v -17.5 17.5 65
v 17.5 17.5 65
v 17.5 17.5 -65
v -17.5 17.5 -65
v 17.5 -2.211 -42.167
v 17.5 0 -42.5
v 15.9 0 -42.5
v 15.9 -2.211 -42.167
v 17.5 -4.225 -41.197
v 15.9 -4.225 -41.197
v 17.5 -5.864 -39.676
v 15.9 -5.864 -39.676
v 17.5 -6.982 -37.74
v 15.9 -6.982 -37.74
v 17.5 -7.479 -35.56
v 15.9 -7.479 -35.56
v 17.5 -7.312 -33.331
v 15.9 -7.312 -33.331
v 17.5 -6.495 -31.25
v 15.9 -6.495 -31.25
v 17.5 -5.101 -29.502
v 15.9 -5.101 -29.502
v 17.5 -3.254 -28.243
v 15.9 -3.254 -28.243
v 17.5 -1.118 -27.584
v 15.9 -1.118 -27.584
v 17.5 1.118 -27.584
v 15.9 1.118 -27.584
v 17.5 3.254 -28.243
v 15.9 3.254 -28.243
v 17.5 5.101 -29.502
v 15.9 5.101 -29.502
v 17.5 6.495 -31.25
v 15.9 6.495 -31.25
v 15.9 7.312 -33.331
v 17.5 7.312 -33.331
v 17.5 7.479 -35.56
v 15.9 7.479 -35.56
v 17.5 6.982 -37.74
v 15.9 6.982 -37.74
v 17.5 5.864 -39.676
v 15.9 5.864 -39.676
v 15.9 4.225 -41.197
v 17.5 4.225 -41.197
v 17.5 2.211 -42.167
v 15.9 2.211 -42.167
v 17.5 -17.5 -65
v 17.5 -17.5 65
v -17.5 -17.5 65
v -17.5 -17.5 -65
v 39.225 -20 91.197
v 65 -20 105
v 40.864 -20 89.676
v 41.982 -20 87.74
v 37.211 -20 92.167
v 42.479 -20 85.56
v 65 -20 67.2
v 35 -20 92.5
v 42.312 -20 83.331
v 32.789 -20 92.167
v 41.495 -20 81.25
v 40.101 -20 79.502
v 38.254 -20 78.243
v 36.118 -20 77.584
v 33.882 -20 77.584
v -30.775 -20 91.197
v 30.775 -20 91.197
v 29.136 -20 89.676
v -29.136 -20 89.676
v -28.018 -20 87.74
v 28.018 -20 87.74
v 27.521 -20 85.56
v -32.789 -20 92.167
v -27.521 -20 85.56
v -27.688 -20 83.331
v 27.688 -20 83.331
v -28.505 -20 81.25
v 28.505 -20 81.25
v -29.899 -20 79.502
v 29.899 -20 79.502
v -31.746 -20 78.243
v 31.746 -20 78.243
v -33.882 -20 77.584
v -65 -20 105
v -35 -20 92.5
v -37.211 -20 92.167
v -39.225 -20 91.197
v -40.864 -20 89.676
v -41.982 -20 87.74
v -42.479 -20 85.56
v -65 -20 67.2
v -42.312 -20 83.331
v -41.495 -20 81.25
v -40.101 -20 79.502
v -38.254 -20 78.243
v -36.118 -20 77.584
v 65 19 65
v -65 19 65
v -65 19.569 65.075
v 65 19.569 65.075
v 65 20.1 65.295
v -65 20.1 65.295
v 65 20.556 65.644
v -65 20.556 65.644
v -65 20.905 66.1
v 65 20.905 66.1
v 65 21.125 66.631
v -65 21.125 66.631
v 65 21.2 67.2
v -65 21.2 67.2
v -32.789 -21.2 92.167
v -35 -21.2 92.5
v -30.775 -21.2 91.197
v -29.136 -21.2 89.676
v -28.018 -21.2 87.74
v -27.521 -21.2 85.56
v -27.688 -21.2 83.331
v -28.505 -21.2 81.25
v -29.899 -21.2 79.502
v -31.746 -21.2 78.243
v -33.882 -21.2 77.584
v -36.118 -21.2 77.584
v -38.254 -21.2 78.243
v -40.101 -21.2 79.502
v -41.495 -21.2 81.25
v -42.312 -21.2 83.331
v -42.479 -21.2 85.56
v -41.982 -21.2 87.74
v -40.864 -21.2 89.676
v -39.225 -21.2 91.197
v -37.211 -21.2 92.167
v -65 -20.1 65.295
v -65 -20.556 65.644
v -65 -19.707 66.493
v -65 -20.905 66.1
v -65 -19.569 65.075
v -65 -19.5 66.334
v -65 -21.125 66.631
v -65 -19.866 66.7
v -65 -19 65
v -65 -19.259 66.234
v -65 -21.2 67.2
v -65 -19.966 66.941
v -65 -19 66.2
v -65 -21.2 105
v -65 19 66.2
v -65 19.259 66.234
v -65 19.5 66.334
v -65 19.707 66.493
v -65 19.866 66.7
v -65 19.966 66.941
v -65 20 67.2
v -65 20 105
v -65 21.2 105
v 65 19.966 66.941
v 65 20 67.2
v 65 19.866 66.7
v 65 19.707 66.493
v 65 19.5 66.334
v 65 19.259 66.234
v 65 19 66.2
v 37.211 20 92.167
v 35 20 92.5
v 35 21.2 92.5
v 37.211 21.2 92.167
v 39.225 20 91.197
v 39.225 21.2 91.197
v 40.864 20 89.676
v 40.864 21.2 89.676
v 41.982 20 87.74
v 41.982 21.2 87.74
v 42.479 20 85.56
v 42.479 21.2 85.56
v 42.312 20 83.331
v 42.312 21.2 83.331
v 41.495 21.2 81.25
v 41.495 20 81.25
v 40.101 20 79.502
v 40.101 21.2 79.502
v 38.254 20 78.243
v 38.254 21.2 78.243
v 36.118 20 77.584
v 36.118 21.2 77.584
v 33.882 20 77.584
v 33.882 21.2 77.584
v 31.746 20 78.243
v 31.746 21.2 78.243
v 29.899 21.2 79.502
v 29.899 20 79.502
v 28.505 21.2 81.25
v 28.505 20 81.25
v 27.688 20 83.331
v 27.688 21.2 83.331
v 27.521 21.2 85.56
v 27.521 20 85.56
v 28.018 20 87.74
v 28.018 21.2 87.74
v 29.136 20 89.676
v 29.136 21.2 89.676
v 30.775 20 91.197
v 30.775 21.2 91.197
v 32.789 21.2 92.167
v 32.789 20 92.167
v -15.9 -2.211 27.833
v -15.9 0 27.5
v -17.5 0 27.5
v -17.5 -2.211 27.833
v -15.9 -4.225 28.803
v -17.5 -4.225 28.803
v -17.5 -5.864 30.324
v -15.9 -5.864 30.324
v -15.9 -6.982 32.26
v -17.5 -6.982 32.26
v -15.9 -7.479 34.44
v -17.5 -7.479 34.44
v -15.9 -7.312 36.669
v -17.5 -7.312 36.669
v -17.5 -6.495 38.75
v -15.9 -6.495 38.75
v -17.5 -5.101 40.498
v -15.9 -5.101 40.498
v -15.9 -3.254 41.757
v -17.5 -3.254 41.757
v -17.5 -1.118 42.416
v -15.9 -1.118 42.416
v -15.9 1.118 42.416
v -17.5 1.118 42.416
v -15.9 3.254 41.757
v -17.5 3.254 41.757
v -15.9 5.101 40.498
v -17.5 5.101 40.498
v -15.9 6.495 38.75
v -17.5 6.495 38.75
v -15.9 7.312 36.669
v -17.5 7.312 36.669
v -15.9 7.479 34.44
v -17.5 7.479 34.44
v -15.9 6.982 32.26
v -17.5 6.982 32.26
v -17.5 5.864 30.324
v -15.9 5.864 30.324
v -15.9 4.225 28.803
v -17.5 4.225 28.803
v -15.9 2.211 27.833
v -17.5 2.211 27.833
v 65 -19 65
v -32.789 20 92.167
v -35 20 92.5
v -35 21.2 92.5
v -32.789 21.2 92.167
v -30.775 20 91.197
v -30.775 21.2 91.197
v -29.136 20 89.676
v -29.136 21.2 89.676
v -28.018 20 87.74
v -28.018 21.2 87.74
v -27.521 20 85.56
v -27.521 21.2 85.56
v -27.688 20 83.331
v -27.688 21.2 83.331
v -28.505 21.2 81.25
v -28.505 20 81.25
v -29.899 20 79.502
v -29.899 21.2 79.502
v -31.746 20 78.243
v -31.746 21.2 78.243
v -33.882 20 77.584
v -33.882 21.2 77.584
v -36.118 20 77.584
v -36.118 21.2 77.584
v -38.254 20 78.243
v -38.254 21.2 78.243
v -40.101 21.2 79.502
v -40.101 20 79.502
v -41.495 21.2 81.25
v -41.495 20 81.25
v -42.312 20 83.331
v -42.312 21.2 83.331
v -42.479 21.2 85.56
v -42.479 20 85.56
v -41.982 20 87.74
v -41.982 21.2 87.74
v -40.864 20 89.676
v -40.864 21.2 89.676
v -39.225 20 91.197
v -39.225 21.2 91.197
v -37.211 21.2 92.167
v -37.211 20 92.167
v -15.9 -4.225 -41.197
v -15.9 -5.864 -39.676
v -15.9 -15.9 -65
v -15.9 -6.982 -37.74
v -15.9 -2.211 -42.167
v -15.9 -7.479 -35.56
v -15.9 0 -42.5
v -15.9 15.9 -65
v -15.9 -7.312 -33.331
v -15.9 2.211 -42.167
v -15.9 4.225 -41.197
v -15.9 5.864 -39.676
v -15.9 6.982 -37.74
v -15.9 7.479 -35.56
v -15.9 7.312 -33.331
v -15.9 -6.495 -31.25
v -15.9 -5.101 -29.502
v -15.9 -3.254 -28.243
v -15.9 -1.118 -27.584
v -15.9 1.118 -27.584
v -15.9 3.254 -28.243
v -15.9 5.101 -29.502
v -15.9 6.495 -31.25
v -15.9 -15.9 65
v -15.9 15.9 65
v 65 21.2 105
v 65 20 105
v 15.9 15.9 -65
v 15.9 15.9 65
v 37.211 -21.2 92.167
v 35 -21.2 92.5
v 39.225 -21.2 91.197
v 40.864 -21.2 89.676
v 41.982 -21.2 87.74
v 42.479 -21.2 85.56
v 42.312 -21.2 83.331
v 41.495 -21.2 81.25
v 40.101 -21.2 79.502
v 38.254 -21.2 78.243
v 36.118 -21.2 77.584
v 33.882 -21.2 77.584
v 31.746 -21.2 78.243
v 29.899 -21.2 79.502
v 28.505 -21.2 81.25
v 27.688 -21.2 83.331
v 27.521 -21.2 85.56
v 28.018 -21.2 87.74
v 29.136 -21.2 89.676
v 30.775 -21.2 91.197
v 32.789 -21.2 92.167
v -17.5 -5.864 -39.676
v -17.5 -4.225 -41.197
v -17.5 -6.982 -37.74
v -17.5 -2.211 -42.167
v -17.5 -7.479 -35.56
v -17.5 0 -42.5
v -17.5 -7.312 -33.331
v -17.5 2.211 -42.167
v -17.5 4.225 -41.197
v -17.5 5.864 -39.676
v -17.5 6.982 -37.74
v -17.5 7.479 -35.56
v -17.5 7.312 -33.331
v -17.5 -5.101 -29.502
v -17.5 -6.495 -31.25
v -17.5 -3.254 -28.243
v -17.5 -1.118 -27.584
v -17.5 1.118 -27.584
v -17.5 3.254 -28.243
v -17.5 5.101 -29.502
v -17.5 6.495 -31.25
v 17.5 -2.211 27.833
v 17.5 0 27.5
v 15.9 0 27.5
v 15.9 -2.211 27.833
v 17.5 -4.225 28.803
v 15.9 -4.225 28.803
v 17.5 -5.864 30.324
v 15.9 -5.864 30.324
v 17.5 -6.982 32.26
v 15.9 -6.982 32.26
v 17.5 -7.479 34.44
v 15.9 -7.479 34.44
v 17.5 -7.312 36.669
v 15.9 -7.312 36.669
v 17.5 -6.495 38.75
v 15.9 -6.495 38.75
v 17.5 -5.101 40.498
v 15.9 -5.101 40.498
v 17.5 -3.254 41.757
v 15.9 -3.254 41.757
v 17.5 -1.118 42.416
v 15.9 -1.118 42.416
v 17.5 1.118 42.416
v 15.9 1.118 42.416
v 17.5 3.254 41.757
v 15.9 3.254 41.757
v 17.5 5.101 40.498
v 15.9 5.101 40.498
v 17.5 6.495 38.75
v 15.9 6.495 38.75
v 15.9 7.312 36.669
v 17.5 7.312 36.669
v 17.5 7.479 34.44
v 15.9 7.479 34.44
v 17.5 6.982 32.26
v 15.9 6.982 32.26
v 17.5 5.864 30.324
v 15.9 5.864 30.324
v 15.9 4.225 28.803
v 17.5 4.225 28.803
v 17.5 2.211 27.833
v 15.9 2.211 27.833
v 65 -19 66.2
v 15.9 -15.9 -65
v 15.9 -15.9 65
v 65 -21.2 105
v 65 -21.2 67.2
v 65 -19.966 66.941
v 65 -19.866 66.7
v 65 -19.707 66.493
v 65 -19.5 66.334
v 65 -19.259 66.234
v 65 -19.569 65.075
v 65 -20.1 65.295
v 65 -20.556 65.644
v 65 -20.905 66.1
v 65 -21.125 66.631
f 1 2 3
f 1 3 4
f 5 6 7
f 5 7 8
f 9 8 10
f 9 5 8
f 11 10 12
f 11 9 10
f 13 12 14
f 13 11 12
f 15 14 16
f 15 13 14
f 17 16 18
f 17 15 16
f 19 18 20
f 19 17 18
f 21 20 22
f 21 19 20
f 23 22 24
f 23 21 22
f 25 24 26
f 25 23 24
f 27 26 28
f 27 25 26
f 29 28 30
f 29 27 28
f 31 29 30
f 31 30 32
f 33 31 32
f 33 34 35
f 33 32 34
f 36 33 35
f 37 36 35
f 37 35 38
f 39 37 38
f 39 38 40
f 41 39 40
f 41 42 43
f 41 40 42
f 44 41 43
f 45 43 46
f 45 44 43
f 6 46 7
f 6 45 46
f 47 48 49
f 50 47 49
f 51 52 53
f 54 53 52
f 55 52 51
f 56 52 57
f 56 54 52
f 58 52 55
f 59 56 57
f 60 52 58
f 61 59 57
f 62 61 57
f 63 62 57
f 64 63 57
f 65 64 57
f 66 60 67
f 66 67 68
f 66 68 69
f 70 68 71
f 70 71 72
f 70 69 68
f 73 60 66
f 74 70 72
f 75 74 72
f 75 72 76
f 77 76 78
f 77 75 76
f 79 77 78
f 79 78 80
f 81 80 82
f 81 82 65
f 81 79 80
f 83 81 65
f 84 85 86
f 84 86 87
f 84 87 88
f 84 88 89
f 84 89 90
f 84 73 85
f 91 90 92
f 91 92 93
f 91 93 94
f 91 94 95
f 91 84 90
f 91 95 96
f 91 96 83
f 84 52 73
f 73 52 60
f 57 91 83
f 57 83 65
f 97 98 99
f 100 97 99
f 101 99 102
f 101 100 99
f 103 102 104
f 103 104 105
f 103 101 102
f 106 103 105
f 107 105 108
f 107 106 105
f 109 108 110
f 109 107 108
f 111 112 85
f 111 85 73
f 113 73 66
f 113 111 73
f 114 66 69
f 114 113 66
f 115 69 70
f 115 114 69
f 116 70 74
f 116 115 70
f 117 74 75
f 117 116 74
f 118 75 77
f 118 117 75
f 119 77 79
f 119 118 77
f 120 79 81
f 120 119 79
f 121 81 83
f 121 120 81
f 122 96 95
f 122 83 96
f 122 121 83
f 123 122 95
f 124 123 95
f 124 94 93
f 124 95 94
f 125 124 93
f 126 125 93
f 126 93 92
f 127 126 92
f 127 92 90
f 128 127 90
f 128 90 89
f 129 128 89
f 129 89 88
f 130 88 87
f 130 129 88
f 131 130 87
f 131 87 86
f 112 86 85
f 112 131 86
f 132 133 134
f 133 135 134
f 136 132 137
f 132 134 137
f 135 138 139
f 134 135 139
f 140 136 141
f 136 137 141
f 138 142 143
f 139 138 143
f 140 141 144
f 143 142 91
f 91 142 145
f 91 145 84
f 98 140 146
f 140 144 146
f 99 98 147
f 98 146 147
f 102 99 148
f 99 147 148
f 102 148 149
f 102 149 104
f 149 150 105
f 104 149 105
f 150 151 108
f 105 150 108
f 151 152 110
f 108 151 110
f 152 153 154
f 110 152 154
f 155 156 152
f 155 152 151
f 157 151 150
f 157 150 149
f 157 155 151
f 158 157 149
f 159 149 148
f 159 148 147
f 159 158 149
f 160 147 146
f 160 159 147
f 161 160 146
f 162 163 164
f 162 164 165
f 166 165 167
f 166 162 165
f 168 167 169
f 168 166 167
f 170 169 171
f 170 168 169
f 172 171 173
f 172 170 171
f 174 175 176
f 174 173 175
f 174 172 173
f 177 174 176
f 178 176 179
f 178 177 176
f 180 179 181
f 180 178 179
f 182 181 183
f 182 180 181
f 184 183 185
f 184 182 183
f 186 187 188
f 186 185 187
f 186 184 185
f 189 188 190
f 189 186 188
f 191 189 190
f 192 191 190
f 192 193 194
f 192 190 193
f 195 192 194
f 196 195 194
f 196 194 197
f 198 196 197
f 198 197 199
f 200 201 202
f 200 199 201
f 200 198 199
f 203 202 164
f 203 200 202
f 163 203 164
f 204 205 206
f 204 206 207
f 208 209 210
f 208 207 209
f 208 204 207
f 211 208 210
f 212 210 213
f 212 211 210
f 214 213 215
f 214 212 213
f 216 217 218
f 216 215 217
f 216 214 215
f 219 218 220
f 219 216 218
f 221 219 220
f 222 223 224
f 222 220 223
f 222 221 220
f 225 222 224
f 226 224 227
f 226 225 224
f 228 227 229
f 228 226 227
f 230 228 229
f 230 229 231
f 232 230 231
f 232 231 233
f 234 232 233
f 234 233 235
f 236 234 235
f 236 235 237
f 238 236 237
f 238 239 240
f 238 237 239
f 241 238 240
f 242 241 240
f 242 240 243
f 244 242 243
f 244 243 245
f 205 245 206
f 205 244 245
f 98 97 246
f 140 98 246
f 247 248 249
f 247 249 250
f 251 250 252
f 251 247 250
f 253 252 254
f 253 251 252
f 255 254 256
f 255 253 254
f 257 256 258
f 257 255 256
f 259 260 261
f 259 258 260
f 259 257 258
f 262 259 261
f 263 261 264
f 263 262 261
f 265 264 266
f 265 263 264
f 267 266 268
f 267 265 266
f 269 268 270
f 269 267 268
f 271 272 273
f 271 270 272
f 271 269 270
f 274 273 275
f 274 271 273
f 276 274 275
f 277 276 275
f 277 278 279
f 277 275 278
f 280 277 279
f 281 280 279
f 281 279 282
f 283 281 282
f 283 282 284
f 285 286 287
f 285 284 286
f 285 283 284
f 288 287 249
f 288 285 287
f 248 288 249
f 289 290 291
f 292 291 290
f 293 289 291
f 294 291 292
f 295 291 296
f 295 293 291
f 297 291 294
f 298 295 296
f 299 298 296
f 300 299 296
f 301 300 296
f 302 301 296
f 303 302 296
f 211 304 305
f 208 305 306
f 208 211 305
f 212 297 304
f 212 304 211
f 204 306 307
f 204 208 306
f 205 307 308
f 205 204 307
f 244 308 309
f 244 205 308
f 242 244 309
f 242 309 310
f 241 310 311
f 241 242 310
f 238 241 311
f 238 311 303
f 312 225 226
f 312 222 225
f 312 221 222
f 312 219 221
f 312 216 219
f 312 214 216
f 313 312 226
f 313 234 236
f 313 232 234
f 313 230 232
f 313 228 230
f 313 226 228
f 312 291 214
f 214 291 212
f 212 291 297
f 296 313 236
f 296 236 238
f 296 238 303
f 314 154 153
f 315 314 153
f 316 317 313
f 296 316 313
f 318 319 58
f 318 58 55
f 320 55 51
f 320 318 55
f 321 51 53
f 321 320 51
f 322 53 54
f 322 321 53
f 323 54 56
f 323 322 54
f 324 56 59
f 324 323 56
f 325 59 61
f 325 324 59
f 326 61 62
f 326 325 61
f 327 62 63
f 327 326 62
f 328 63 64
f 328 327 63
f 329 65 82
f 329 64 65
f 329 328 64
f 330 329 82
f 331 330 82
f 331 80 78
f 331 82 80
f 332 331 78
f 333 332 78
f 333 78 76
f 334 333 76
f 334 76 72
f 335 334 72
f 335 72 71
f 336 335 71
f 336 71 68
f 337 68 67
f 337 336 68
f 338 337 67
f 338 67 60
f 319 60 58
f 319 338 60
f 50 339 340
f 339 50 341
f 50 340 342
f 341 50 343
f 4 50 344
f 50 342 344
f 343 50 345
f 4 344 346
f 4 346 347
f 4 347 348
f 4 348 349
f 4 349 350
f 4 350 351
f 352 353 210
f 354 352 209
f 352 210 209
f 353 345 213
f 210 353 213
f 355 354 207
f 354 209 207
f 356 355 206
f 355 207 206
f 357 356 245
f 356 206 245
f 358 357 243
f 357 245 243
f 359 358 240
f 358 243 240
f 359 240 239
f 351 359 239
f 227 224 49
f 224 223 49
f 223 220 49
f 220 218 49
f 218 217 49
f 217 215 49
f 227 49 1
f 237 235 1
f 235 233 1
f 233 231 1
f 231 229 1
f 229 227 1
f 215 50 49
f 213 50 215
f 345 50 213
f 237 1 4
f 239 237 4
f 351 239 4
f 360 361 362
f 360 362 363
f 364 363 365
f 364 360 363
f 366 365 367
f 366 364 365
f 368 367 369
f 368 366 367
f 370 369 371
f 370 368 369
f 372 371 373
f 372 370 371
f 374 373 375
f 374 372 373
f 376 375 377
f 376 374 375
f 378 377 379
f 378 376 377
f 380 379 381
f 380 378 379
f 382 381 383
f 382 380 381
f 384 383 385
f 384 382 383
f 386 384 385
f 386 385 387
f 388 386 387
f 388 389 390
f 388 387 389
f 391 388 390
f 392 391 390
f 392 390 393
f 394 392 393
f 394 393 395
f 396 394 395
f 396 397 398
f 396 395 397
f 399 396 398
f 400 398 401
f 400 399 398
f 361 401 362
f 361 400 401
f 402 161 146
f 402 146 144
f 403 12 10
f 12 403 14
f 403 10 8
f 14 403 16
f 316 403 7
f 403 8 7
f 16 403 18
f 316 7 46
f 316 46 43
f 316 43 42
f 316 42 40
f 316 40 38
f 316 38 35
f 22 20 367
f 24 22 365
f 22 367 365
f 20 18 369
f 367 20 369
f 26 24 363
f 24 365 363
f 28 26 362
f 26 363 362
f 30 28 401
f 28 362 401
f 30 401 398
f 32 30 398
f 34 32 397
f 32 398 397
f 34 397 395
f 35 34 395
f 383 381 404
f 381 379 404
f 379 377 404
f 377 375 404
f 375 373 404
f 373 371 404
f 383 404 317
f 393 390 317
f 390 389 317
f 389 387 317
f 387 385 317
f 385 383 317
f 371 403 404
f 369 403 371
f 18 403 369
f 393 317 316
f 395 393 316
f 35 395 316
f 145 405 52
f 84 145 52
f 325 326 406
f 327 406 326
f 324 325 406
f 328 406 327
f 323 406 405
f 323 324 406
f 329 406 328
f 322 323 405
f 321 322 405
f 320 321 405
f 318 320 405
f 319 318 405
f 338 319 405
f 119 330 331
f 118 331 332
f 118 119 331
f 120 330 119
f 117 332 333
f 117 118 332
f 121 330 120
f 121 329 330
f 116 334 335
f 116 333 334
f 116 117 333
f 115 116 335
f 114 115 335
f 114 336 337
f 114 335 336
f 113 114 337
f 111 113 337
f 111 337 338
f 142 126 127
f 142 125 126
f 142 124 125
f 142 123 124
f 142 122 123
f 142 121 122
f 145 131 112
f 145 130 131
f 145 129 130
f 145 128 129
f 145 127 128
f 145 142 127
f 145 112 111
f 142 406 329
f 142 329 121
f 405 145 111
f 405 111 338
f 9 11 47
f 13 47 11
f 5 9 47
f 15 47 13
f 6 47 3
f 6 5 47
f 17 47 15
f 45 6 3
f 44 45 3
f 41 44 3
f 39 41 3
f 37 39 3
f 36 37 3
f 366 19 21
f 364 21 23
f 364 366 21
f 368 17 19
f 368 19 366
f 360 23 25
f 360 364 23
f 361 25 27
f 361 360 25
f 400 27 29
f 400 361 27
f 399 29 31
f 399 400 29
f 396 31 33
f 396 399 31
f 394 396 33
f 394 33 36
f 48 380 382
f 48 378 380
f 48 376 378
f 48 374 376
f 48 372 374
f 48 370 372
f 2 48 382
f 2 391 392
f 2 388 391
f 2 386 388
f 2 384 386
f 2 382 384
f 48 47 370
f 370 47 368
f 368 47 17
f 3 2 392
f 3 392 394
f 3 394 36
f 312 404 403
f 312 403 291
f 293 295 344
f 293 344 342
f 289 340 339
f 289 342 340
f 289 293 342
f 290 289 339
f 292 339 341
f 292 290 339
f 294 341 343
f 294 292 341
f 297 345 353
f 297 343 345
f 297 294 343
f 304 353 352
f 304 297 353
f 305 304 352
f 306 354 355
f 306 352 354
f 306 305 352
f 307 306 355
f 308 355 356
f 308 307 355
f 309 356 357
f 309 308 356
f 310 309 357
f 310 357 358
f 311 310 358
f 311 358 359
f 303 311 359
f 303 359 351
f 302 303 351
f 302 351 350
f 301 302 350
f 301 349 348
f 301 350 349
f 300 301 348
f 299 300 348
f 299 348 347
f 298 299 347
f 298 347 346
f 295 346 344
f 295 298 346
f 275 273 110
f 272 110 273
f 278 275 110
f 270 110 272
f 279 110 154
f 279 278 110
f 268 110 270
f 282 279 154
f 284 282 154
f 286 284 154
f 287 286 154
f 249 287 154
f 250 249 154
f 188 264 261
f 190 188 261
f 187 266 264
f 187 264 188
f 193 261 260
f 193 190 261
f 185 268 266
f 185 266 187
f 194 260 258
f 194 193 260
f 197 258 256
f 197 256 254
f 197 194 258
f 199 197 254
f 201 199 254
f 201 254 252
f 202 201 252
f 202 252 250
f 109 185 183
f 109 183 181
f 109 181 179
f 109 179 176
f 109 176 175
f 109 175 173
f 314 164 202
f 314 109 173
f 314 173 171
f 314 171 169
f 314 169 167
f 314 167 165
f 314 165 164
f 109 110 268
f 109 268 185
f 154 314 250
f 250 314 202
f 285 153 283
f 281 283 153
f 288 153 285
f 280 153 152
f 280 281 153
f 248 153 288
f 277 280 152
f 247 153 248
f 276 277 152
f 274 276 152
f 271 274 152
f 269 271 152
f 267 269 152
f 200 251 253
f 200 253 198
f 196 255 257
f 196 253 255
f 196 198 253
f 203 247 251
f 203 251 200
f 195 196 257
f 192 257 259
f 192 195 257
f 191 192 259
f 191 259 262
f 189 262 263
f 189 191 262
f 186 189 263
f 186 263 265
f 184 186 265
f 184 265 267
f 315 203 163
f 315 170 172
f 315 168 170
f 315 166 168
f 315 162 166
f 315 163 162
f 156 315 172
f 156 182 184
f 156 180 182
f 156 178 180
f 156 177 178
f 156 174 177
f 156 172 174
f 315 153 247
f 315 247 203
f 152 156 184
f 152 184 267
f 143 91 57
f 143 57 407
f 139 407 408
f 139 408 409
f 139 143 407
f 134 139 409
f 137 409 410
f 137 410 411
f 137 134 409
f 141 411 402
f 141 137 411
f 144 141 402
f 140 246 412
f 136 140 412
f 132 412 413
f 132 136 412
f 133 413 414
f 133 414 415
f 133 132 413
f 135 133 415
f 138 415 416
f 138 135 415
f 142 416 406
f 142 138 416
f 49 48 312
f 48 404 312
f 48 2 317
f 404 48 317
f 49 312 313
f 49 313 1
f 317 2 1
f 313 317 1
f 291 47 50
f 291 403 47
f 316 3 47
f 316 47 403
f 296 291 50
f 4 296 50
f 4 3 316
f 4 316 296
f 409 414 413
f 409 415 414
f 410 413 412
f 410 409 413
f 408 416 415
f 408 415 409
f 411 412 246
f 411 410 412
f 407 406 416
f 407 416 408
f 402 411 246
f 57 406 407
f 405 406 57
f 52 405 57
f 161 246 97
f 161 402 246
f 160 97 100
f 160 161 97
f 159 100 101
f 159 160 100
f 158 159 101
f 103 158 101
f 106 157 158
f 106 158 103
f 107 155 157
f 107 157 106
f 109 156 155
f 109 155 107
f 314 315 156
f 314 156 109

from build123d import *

# Parameters (mm, degrees)
CROQUIS11_W                        = 35
CROQUIS11_H                        = 35
CROQUIS11_W_2                      = 31.8
CROQUIS11_H_2                      = 31.8
CUADRADO_35X35X1_6_1_DEPTH         = 130
CORTAR_EXTRUIR1_DEPTH              = 76.869954527
CORTAR_EXTRUIR1_DEPTH_BACK         = 76.869954527
CROQUIS12_R                        = 7.5
CROQUIS14_W                        = 40
CROQUIS14_H                        = 130
BRIDA_BASE1_DEPTH                  = 1.2
BRIDA_DE_ARISTA1_STRIP_W           = 6.8
BRIDA_DE_ARISTA1_STRIP_H           = 1.2
BRIDA_DE_ARISTA1_STRIP_CUT_DEPTH   = 130
BRIDA_DE_ARISTA1_STRIP_2_W         = 6.8
BRIDA_DE_ARISTA1_STRIP_2_H         = 1.2
BRIDA_DE_ARISTA1_STRIP_CUT_2_DEPTH = 130
BRIDA_DE_ARISTA1_DEPTH             = 130
BRIDA_DE_ARISTA1_BEND_DEPTH        = 130
CORTAR_EXTRUIR2_DEPTH              = 131.567070887
CORTAR_EXTRUIR2_DEPTH_BACK         = 131.567070887
CROQUIS26_R                        = 7.5
S_LIDO_MOVER_COPIAR1_ANGLE         = 90


# Sheet-metal steps are written as plain solids
with BuildPart() as part:
    # Croquis11 → Cuadrado 35X35X1.6(1) (new body)
    with BuildSketch(Plane(origin=(0, 0, 65), x_dir=(-1, 0, 0), z_dir=(0, 0, -1))):
        Rectangle(CROQUIS11_W, CROQUIS11_H)
        Rectangle(CROQUIS11_W_2, CROQUIS11_H_2, mode=Mode.SUBTRACT)
    extrude(amount=CUADRADO_35X35X1_6_1_DEPTH)

    # Croquis12 → Cortar-Extruir1 (cut, two sides: drawn at the far end of the back side and taken through both)
    with BuildSketch(Plane.ZY.offset(17.5).offset(-CORTAR_EXTRUIR1_DEPTH_BACK)):
        with Locations(Location((35, 0, 0), (0, 0, 180))):
            Circle(CROQUIS12_R)
        with Locations(Location((-35, 0, 0), (0, 0, 180))):
            Circle(CROQUIS12_R)
    extrude(amount=CORTAR_EXTRUIR1_DEPTH + CORTAR_EXTRUIR1_DEPTH_BACK, mode=Mode.SUBTRACT)


with BuildPart() as body_2:
    # Croquis14 → Brida base1 (new body)
    with BuildSketch(Plane.XY.offset(65)):
        Rectangle(CROQUIS14_W, CROQUIS14_H)
    extrude(amount=BRIDA_BASE1_DEPTH)

    # Brida de arista1 strip (across the edge) → Brida de arista1 strip cut (cut)
    with BuildSketch(Plane(origin=(20, -65, 66.2), x_dir=(-1, 0, 0), z_dir=(0, 1, 0))):
        with Locations((-2.4, -0.6)):
            Rectangle(BRIDA_DE_ARISTA1_STRIP_W, BRIDA_DE_ARISTA1_STRIP_H)
    extrude(amount=BRIDA_DE_ARISTA1_STRIP_CUT_DEPTH, mode=Mode.SUBTRACT)

    # Brida de arista1 strip 2 (across the edge) → Brida de arista1 strip cut 2 (cut)
    with BuildSketch(Plane(origin=(-20, 65, 66.2), x_dir=(1, 0, 0), z_dir=(0, -1, 0))):
        with Locations((-2.4, -0.6)):
            Rectangle(BRIDA_DE_ARISTA1_STRIP_2_W, BRIDA_DE_ARISTA1_STRIP_2_H)
    extrude(amount=BRIDA_DE_ARISTA1_STRIP_CUT_2_DEPTH, mode=Mode.SUBTRACT)

    # Brida de arista1 section (across the edge) → Brida de arista1 (add)
    with BuildSketch(Plane(origin=(20, -65, 66.2), x_dir=(-1, 0, 0), z_dir=(0, 1, 0))):
        with BuildLine():
            Line((-1.2, 1), (-1.2, 38.8))
            Line((-1.2, 38.8), (0, 38.8))
            Line((0, 38.8), (0, 1))
            ThreePointArc((0, 1), (0.292893219, 0.292893219), (1, 0))
            Line((1, 0), (1, -1.2))
            ThreePointArc((1, -1.2), (-0.555634919, -0.555634919), (-1.2, 1))
        make_face()
    extrude(amount=BRIDA_DE_ARISTA1_DEPTH)

    # Brida de arista1 section 2 (across the edge) → Brida de arista1 bend (add)
    with BuildSketch(Plane(origin=(-20, 65, 66.2), x_dir=(1, 0, 0), z_dir=(0, -1, 0))):
        with BuildLine():
            Line((-1.2, 1), (-1.2, 38.8))
            Line((-1.2, 38.8), (0, 38.8))
            Line((0, 38.8), (0, 1))
            ThreePointArc((0, 1), (0.292893219, 0.292893219), (1, 0))
            Line((1, 0), (1, -1.2))
            ThreePointArc((1, -1.2), (-0.555634919, -0.555634919), (-1.2, 1))
        make_face()
    extrude(amount=BRIDA_DE_ARISTA1_BEND_DEPTH)

    # Croquis26 → Cortar-Extruir2 (cut, two sides: drawn at the far end of the back side and taken through both)
    with BuildSketch(Plane.ZY.offset(21.2).offset(-CORTAR_EXTRUIR2_DEPTH_BACK)):
        with Locations((85, 35)):
            Circle(CROQUIS26_R)
        with Locations((85, -35)):
            Circle(CROQUIS26_R)
    extrude(amount=CORTAR_EXTRUIR2_DEPTH + CORTAR_EXTRUIR2_DEPTH_BACK, mode=Mode.SUBTRACT)


with BuildPart() as body_2_1:
    # Sólido-Mover/Copiar1: moved
    add(body_2.part.rotate(Axis((0, 0, 0), (0, 0, -1)), S_LIDO_MOVER_COPIAR1_ANGLE))


solid = Compound([part.part, body_2_1.part])
